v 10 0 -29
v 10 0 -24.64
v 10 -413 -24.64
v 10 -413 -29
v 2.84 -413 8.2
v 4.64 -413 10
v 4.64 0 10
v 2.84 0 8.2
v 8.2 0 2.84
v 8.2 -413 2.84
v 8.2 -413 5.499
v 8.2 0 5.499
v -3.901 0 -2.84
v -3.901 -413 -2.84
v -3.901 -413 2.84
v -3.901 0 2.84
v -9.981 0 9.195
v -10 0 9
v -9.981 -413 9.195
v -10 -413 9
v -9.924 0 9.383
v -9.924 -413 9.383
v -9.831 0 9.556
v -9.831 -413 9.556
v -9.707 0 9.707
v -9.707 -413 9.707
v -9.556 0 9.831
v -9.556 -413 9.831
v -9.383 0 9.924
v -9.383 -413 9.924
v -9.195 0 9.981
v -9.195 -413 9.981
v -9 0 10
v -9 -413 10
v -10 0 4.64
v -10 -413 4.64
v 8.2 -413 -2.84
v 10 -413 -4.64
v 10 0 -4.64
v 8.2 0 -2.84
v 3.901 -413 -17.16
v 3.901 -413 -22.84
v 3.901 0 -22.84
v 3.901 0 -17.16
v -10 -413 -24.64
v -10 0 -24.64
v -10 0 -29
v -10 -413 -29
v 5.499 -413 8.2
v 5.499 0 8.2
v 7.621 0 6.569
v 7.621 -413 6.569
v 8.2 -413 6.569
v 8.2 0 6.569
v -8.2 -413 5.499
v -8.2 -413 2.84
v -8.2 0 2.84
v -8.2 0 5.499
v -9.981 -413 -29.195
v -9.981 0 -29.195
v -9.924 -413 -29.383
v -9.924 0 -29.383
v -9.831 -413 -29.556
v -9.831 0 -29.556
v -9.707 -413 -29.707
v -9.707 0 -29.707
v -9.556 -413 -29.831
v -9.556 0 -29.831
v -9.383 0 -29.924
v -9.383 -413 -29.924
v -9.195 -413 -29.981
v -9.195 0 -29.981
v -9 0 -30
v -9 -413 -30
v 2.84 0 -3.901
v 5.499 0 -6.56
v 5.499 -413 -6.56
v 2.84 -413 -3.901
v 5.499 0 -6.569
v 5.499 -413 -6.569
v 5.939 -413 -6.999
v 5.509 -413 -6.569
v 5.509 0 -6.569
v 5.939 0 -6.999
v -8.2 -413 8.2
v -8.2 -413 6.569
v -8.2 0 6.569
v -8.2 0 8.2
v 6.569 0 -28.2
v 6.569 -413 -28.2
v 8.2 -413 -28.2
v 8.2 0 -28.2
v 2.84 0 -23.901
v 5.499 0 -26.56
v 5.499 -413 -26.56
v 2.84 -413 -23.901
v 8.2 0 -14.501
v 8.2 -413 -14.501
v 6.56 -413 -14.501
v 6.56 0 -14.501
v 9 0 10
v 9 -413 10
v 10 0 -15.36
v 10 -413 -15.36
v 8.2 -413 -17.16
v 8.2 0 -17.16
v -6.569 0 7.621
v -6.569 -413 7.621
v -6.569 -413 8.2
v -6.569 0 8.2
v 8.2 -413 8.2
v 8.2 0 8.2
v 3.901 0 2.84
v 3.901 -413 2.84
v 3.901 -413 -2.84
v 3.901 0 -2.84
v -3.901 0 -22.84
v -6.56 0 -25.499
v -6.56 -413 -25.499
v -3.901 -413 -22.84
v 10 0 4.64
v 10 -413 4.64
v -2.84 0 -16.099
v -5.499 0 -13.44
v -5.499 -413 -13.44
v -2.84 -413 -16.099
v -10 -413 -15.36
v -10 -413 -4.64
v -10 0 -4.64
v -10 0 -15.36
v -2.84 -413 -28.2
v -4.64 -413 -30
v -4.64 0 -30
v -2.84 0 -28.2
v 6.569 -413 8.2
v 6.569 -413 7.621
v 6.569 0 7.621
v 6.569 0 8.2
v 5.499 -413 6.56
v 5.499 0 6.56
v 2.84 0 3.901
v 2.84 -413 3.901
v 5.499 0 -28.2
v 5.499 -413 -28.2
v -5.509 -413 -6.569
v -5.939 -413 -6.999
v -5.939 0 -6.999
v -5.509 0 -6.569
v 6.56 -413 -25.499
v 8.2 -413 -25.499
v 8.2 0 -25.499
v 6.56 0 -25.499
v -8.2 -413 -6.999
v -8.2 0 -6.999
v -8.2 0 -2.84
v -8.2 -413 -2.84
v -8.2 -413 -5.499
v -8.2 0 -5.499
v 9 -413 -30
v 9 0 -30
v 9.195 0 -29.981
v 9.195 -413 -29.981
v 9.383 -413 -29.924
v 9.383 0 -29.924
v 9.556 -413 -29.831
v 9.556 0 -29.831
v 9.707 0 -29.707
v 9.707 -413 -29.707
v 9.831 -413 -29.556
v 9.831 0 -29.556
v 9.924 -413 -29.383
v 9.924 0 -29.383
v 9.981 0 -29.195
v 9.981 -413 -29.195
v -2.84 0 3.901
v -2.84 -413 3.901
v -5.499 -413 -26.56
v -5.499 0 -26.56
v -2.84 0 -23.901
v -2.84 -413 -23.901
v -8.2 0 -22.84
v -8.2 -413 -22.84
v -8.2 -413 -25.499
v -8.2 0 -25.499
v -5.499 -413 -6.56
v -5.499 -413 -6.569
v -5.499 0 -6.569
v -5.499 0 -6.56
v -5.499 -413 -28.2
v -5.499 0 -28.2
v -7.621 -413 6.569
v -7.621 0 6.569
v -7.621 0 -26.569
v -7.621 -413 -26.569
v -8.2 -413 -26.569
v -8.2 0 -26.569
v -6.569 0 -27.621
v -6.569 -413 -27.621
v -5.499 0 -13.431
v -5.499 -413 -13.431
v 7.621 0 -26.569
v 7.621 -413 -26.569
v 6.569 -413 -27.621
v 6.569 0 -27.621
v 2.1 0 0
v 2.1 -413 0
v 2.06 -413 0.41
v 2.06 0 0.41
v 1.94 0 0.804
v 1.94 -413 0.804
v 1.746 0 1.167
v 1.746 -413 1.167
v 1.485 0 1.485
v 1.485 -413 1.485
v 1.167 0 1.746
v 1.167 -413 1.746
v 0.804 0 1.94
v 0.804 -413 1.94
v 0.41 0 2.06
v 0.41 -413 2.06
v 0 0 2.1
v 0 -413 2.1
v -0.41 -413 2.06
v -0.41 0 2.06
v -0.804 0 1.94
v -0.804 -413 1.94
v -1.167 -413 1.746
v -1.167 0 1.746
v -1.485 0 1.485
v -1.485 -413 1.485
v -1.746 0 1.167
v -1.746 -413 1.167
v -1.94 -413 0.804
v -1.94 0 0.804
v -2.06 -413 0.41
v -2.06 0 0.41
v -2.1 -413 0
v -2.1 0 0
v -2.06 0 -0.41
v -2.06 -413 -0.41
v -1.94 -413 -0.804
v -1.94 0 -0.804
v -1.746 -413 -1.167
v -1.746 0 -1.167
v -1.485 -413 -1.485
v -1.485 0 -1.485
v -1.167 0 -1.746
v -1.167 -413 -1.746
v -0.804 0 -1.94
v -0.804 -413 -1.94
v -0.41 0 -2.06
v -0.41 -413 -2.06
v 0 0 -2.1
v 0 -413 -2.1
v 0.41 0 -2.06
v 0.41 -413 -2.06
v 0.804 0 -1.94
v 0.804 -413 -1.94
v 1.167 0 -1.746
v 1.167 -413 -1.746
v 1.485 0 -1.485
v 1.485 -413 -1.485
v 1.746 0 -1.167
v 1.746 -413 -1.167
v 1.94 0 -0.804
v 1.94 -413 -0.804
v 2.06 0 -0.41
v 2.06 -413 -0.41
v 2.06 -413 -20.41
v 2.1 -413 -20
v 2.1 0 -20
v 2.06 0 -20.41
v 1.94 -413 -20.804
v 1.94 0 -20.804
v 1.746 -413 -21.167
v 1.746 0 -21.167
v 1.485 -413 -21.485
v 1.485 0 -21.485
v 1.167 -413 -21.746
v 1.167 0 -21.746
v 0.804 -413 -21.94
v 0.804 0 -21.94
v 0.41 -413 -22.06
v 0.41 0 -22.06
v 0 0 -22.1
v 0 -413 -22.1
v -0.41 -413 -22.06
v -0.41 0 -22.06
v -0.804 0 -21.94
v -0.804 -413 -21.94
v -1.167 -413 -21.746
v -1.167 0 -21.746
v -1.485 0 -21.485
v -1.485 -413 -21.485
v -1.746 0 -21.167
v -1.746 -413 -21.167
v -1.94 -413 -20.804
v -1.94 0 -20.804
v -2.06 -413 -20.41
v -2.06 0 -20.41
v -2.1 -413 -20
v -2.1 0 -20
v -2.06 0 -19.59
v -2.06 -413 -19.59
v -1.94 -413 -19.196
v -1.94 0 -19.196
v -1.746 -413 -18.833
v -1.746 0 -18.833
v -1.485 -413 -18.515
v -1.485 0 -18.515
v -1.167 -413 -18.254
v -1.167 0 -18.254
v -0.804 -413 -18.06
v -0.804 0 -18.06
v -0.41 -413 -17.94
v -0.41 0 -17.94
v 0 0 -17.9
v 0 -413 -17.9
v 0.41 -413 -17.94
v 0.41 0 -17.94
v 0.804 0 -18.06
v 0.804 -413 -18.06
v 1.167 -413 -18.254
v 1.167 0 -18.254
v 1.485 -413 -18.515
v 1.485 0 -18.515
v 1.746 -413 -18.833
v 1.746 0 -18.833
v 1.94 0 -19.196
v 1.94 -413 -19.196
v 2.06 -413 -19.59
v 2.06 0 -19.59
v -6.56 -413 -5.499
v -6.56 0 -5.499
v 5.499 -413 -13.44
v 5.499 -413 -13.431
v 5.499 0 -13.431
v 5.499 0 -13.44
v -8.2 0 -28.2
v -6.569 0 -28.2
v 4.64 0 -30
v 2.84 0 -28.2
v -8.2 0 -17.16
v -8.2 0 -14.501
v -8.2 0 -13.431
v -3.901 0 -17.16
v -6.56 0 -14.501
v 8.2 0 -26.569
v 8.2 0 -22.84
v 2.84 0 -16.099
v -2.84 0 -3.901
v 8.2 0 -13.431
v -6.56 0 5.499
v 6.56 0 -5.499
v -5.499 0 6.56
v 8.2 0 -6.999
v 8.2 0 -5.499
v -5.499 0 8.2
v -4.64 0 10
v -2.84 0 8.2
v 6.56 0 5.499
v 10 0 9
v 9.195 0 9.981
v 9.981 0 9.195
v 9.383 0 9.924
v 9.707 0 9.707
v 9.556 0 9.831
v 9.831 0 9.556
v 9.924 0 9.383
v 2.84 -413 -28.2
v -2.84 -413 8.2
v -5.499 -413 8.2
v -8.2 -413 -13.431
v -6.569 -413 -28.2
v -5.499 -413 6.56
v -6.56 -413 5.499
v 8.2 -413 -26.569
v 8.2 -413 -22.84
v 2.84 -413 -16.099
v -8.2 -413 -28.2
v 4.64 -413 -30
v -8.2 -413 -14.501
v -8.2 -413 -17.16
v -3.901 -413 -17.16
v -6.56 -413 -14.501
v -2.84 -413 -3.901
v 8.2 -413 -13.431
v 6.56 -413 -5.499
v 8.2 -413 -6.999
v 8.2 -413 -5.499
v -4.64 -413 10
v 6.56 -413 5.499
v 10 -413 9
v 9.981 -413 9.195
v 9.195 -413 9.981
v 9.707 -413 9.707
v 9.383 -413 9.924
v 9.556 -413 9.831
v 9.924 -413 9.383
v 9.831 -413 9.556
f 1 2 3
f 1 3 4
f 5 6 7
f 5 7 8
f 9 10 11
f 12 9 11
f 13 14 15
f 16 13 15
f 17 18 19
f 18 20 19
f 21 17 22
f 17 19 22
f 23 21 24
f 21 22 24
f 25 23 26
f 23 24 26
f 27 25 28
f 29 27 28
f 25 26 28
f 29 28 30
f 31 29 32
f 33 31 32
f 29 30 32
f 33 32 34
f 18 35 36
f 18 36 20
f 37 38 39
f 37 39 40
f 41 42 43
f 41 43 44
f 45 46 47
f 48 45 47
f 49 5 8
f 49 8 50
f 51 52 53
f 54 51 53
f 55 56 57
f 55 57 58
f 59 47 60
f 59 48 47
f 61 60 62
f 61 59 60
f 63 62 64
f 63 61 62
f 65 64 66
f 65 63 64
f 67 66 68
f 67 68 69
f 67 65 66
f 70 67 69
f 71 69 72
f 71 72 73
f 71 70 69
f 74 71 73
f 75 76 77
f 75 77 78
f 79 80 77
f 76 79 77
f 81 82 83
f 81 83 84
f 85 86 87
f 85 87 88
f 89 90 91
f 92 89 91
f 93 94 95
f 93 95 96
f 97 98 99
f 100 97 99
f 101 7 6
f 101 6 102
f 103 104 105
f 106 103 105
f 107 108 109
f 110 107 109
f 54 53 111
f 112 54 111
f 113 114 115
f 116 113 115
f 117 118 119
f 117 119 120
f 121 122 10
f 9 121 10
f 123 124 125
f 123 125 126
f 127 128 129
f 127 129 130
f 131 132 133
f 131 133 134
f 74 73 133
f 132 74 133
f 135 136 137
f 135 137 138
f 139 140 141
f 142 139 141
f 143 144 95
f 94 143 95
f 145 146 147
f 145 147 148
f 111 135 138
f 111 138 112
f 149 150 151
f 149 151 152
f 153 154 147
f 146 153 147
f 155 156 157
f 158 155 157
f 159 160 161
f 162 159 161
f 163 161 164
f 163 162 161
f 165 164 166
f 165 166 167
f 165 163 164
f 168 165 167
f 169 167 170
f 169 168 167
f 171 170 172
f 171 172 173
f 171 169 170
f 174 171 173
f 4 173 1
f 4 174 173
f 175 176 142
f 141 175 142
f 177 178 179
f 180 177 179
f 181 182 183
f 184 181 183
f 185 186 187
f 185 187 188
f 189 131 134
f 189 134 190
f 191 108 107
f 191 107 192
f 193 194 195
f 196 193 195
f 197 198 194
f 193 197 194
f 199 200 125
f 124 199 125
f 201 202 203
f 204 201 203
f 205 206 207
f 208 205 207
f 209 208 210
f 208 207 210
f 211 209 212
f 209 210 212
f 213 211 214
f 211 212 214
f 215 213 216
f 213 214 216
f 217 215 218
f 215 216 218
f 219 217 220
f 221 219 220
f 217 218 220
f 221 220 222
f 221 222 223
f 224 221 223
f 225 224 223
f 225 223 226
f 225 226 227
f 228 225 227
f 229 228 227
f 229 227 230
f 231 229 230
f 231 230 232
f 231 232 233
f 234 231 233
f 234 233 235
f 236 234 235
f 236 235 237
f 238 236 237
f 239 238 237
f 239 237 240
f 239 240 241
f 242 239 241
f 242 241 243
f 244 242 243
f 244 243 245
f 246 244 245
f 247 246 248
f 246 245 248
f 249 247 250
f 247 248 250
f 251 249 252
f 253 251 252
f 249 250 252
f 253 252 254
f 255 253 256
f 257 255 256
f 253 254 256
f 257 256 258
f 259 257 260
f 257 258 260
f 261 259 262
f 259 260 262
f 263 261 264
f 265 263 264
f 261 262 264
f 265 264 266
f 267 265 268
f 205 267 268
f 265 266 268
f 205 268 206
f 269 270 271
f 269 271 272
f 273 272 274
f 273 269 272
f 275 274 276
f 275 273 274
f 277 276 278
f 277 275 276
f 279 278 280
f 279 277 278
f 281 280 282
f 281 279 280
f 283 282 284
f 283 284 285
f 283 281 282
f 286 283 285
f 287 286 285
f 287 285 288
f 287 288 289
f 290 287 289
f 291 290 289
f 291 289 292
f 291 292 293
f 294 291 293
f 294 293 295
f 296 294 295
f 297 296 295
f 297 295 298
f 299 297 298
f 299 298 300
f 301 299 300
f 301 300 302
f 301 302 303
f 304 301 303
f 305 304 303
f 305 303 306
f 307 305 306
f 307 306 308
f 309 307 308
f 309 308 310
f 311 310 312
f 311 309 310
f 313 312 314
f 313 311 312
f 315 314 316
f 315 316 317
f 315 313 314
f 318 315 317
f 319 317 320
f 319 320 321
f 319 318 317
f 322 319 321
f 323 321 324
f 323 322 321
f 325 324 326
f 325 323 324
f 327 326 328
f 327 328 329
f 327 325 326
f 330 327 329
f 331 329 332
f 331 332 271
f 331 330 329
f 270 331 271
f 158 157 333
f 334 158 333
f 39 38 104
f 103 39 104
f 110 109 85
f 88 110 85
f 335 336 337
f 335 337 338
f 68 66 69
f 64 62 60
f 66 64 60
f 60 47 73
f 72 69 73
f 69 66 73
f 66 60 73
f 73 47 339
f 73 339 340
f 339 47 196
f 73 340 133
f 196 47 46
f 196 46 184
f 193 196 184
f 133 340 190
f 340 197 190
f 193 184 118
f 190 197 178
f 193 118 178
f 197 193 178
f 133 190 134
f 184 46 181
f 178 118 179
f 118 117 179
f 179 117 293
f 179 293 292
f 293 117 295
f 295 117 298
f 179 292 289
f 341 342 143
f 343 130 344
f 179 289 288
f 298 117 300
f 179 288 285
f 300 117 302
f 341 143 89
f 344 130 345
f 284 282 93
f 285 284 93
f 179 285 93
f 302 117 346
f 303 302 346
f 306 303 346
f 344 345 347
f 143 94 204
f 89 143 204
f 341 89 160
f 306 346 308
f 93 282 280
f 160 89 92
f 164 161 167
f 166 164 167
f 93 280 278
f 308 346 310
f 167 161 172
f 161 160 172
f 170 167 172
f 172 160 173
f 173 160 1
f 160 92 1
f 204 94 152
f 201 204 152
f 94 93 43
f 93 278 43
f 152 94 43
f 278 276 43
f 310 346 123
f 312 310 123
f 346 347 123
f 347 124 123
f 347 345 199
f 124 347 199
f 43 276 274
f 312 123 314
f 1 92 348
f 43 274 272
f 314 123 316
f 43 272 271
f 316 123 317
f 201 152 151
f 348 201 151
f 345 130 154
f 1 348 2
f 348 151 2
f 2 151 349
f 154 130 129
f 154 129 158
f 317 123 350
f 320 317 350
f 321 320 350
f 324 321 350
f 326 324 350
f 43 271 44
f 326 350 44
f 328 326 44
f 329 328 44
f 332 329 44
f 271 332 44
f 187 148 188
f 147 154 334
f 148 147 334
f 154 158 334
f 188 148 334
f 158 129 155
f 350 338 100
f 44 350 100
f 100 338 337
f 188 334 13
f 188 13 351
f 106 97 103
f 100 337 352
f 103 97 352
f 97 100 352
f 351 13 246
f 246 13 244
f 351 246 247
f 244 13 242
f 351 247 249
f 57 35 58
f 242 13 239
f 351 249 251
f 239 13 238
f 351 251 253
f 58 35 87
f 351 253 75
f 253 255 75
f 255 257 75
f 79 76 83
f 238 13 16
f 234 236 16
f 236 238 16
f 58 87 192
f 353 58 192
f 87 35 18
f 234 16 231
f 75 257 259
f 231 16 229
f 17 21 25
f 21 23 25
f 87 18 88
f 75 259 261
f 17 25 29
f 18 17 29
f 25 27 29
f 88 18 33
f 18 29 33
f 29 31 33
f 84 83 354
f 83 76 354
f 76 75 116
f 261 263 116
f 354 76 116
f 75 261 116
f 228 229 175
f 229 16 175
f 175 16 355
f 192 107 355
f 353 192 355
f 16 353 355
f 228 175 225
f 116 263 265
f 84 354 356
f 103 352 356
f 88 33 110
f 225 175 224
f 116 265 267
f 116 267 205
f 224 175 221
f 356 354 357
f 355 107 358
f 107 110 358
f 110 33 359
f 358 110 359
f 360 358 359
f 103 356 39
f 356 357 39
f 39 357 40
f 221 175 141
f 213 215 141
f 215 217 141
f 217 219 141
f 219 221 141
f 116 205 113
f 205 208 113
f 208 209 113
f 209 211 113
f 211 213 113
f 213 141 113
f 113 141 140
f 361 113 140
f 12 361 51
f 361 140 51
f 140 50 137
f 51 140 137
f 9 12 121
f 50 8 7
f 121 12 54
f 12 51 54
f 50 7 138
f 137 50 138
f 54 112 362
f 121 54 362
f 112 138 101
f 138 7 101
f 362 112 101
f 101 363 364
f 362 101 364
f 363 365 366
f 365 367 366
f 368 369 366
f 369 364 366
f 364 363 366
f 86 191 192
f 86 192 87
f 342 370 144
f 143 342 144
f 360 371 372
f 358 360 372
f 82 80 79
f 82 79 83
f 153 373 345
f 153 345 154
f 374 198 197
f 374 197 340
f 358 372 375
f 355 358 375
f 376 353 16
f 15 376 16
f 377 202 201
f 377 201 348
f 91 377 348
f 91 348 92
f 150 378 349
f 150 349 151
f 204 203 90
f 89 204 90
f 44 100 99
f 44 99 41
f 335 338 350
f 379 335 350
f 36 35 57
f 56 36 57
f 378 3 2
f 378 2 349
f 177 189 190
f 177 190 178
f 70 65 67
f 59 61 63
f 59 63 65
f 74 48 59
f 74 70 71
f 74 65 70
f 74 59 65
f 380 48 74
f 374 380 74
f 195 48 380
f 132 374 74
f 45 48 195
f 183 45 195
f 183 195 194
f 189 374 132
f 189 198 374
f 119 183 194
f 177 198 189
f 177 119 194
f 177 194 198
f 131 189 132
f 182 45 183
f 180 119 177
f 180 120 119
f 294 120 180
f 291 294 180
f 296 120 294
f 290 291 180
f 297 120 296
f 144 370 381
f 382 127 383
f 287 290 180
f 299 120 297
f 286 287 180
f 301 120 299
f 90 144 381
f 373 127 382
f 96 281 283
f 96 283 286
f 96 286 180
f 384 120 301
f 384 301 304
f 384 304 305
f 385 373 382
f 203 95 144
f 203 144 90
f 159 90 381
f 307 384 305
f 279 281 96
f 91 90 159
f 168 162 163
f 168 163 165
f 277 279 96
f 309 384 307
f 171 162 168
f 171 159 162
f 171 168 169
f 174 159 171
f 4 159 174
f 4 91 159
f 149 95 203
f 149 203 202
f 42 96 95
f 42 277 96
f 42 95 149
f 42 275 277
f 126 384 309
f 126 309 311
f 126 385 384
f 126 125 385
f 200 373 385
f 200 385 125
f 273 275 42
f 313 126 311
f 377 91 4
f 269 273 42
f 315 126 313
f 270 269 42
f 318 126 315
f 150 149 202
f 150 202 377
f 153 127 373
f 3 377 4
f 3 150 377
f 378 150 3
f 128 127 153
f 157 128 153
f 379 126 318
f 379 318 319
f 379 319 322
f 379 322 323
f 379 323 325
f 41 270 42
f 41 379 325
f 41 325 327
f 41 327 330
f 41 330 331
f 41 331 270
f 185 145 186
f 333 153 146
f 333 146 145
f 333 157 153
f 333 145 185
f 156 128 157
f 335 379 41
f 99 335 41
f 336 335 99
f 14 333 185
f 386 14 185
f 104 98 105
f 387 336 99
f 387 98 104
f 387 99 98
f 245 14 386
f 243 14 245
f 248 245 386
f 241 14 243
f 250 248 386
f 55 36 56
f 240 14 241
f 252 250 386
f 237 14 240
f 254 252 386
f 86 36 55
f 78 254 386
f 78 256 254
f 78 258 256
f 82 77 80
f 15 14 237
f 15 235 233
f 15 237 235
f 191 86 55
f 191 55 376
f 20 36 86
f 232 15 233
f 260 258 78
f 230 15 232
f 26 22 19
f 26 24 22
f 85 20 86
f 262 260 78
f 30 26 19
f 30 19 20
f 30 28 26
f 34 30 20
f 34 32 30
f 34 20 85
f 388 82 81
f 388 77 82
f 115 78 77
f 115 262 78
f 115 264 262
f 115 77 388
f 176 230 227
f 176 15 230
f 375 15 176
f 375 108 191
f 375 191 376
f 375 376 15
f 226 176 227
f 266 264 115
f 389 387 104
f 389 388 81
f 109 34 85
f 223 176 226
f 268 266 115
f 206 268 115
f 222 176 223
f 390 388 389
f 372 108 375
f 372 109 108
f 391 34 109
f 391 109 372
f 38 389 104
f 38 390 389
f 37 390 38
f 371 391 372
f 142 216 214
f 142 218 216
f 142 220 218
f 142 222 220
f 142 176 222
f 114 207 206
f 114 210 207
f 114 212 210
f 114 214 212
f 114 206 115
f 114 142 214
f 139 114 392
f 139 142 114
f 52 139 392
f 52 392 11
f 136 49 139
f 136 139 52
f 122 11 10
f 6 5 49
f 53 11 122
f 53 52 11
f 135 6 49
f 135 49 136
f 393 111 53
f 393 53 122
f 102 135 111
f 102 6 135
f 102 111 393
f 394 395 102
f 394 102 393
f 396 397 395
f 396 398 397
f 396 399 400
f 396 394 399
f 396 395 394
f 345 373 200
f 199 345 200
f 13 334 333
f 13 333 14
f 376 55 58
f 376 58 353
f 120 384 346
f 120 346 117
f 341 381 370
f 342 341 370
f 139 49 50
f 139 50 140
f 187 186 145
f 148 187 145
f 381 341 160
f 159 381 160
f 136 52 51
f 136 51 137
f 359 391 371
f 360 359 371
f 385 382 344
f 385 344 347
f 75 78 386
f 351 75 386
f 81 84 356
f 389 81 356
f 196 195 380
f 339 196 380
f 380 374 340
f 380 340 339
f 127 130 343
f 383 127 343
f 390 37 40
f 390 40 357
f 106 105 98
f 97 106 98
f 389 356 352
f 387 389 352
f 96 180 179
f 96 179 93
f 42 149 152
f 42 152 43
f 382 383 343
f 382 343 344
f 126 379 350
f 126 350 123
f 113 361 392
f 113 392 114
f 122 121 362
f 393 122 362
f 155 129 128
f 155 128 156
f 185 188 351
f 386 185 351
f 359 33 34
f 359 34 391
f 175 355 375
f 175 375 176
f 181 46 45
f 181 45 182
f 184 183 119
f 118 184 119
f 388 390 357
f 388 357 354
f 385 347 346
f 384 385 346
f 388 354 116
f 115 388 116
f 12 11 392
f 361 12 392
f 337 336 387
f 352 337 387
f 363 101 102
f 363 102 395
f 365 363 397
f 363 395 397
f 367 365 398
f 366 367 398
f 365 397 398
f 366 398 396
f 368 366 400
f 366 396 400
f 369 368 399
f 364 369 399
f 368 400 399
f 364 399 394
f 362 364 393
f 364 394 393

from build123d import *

# Parameters (mm, degrees)
F0_W             = 20
F0_H             = 20
F1_DEPTH         = 413
F2_R             = 2.1
F3_DEPTH         = 413.001
F4_R             = 1
F6_DEPTH         = 413.001
F6_COPIES3_COUNT = 2
F6_COPIES3_ANGLE = 90
F6_COPIES4_COUNT = 2
F6_COPIES4_ANGLE = 270
F6_COPIES6_COUNT = 2
F9_W             = 16.4
F9_H             = 6.8613203436
F10_DEPTH        = 413.001
F12_DEPTH        = 413


# Not quite as in the source:
# - a pattern or mirror of a feature is missing from the dataset's text; its kind, count and spacing are read off the source's solid


with BuildPart() as f1:
    # F0 (on Front) → F1 (new body)
    with BuildSketch(Plane.XZ):
        Rectangle(F0_W, F0_H)
    extrude(amount=F1_DEPTH)

    # F2 (on face) → F3 (cut, through all)
    with BuildSketch(Plane.XZ.offset(413)):
        Circle(F2_R)
    extrude(amount=-F3_DEPTH, mode=Mode.SUBTRACT)

    # F4
    f4_edges = [f1.edges().sort_by_distance(p)[0] for p in [
        (-10, -206.5, 10),
        (10, -206.5, 10),
    ]]
    fillet(f4_edges, radius=F4_R)

    # F5 (on face) → F6 (cut, through all)
    with BuildSketch(Plane.XZ.offset(413)):
        Polygon((0, 3.9006601718), (0, 10), (-2.84, 10), (-4.64, 10), (-2.84, 8.2), (-5.4993398282, 8.2), (-5.4993398282, 6.56), (-2.84, 3.9006601718), align=None)
        Polygon((-6.5693398282, 8.2), (-8.2, 8.2), (-7.0953059148, 7.0953059148), (-6.5693398282, 7.6212720014), align=None)
    f6 = extrude(amount=-F6_DEPTH, mode=Mode.SUBTRACT)

    # F6_copies: F6 across plane
    add(f6.mirror(Plane(origin=(0, 0, 0), x_dir=(-0.7071067812, 0, -0.7071067812), z_dir=(0.7071067812, 0, -0.7071067812))), mode=Mode.SUBTRACT)

    # F6_copies1: F6 across plane
    add(f6.mirror(Plane(origin=(0, 0, 0), x_dir=(0.7071067812, 0, -0.7071067812), z_dir=(-0.7071067812, 0, -0.7071067812))), mode=Mode.SUBTRACT)

    # F6_copies2: F6 across plane
    add(f6.mirror(Plane(origin=(0, 0, 0), x_dir=(0, 0, 1), z_dir=(1, 0, 0))), mode=Mode.SUBTRACT)

    # F6_copies3: F6 ×2 about axis
    f6_copies3_axis = Axis((0, 0, 0), (0, 1, 0))
    for i in range(1, F6_COPIES3_COUNT):
        add(f6.rotate(f6_copies3_axis, i * F6_COPIES3_ANGLE / (F6_COPIES3_COUNT - 1)), mode=Mode.SUBTRACT)

    # F6_copies4: F6 ×2 about axis
    f6_copies4_axis = Axis((0, 0, 0), (0, 1, 0))
    for i in range(1, F6_COPIES4_COUNT):
        add(f6.rotate(f6_copies4_axis, i * F6_COPIES4_ANGLE / (F6_COPIES4_COUNT - 1)), mode=Mode.SUBTRACT)

    # F6_copies5: F6 across plane
    add(f6.mirror(Plane(origin=(0, 0, 0), x_dir=(-1, 0, 0), z_dir=(0, 0, -1))), mode=Mode.SUBTRACT)

    # F6_copies6: F6 ×2 about axis
    f6_copies6_axis = Axis((0, 0, 0), (0, 1, 0))
    for i in range(1, F6_COPIES6_COUNT):
        add(f6.rotate(f6_copies6_axis, i * 360 / F6_COPIES6_COUNT), mode=Mode.SUBTRACT)

    # F8: F1 across face


with BuildPart() as f1_1:
    add(f1.part)
    add(f1.part.mirror(Plane(origin=(-7.32, -206.5, -10), x_dir=(1, 0, 0), z_dir=(0, 0, -1))))

    # F9 (on face) → F10 (cut, through all)
    with BuildSketch(Plane.XZ.offset(413)):
        with Locations((0, -10)):
            Rectangle(F9_W, F9_H)
    extrude(amount=-F10_DEPTH, mode=Mode.SUBTRACT)

    # F11 (on face) → F12 (join, through all)
    with BuildSketch(Plane.XZ.offset(413)):
        with BuildLine():
            ThreePointArc((-9, -10), (-9.7071067812, -9.7071067812), (-10, -9))
            Line((-10, -9), (-10, -11))
            ThreePointArc((-10, -11), (-9.7071067812, -10.2928932188), (-9, -10))
        make_face()
        with BuildLine():
            ThreePointArc((10, -9), (9.7071067812, -9.7071067812), (9, -10))
            ThreePointArc((9, -10), (9.7071067812, -10.2928932188), (10, -11))
            Line((10, -11), (10, -9))
        make_face()
        Polygon((5.9386796564, -6.9993398282), (8.2, -6.9993398282), (8.2, -6.5693398282), (5.5086796564, -6.5693398282), align=None)
        Polygon((-8.2, -6.5693398282), (-8.2, -6.9993398282), (-5.9386796564, -6.9993398282), (-5.5086796564, -6.5693398282), align=None)
    extrude(amount=-F12_DEPTH)


solid = f1_1.part
